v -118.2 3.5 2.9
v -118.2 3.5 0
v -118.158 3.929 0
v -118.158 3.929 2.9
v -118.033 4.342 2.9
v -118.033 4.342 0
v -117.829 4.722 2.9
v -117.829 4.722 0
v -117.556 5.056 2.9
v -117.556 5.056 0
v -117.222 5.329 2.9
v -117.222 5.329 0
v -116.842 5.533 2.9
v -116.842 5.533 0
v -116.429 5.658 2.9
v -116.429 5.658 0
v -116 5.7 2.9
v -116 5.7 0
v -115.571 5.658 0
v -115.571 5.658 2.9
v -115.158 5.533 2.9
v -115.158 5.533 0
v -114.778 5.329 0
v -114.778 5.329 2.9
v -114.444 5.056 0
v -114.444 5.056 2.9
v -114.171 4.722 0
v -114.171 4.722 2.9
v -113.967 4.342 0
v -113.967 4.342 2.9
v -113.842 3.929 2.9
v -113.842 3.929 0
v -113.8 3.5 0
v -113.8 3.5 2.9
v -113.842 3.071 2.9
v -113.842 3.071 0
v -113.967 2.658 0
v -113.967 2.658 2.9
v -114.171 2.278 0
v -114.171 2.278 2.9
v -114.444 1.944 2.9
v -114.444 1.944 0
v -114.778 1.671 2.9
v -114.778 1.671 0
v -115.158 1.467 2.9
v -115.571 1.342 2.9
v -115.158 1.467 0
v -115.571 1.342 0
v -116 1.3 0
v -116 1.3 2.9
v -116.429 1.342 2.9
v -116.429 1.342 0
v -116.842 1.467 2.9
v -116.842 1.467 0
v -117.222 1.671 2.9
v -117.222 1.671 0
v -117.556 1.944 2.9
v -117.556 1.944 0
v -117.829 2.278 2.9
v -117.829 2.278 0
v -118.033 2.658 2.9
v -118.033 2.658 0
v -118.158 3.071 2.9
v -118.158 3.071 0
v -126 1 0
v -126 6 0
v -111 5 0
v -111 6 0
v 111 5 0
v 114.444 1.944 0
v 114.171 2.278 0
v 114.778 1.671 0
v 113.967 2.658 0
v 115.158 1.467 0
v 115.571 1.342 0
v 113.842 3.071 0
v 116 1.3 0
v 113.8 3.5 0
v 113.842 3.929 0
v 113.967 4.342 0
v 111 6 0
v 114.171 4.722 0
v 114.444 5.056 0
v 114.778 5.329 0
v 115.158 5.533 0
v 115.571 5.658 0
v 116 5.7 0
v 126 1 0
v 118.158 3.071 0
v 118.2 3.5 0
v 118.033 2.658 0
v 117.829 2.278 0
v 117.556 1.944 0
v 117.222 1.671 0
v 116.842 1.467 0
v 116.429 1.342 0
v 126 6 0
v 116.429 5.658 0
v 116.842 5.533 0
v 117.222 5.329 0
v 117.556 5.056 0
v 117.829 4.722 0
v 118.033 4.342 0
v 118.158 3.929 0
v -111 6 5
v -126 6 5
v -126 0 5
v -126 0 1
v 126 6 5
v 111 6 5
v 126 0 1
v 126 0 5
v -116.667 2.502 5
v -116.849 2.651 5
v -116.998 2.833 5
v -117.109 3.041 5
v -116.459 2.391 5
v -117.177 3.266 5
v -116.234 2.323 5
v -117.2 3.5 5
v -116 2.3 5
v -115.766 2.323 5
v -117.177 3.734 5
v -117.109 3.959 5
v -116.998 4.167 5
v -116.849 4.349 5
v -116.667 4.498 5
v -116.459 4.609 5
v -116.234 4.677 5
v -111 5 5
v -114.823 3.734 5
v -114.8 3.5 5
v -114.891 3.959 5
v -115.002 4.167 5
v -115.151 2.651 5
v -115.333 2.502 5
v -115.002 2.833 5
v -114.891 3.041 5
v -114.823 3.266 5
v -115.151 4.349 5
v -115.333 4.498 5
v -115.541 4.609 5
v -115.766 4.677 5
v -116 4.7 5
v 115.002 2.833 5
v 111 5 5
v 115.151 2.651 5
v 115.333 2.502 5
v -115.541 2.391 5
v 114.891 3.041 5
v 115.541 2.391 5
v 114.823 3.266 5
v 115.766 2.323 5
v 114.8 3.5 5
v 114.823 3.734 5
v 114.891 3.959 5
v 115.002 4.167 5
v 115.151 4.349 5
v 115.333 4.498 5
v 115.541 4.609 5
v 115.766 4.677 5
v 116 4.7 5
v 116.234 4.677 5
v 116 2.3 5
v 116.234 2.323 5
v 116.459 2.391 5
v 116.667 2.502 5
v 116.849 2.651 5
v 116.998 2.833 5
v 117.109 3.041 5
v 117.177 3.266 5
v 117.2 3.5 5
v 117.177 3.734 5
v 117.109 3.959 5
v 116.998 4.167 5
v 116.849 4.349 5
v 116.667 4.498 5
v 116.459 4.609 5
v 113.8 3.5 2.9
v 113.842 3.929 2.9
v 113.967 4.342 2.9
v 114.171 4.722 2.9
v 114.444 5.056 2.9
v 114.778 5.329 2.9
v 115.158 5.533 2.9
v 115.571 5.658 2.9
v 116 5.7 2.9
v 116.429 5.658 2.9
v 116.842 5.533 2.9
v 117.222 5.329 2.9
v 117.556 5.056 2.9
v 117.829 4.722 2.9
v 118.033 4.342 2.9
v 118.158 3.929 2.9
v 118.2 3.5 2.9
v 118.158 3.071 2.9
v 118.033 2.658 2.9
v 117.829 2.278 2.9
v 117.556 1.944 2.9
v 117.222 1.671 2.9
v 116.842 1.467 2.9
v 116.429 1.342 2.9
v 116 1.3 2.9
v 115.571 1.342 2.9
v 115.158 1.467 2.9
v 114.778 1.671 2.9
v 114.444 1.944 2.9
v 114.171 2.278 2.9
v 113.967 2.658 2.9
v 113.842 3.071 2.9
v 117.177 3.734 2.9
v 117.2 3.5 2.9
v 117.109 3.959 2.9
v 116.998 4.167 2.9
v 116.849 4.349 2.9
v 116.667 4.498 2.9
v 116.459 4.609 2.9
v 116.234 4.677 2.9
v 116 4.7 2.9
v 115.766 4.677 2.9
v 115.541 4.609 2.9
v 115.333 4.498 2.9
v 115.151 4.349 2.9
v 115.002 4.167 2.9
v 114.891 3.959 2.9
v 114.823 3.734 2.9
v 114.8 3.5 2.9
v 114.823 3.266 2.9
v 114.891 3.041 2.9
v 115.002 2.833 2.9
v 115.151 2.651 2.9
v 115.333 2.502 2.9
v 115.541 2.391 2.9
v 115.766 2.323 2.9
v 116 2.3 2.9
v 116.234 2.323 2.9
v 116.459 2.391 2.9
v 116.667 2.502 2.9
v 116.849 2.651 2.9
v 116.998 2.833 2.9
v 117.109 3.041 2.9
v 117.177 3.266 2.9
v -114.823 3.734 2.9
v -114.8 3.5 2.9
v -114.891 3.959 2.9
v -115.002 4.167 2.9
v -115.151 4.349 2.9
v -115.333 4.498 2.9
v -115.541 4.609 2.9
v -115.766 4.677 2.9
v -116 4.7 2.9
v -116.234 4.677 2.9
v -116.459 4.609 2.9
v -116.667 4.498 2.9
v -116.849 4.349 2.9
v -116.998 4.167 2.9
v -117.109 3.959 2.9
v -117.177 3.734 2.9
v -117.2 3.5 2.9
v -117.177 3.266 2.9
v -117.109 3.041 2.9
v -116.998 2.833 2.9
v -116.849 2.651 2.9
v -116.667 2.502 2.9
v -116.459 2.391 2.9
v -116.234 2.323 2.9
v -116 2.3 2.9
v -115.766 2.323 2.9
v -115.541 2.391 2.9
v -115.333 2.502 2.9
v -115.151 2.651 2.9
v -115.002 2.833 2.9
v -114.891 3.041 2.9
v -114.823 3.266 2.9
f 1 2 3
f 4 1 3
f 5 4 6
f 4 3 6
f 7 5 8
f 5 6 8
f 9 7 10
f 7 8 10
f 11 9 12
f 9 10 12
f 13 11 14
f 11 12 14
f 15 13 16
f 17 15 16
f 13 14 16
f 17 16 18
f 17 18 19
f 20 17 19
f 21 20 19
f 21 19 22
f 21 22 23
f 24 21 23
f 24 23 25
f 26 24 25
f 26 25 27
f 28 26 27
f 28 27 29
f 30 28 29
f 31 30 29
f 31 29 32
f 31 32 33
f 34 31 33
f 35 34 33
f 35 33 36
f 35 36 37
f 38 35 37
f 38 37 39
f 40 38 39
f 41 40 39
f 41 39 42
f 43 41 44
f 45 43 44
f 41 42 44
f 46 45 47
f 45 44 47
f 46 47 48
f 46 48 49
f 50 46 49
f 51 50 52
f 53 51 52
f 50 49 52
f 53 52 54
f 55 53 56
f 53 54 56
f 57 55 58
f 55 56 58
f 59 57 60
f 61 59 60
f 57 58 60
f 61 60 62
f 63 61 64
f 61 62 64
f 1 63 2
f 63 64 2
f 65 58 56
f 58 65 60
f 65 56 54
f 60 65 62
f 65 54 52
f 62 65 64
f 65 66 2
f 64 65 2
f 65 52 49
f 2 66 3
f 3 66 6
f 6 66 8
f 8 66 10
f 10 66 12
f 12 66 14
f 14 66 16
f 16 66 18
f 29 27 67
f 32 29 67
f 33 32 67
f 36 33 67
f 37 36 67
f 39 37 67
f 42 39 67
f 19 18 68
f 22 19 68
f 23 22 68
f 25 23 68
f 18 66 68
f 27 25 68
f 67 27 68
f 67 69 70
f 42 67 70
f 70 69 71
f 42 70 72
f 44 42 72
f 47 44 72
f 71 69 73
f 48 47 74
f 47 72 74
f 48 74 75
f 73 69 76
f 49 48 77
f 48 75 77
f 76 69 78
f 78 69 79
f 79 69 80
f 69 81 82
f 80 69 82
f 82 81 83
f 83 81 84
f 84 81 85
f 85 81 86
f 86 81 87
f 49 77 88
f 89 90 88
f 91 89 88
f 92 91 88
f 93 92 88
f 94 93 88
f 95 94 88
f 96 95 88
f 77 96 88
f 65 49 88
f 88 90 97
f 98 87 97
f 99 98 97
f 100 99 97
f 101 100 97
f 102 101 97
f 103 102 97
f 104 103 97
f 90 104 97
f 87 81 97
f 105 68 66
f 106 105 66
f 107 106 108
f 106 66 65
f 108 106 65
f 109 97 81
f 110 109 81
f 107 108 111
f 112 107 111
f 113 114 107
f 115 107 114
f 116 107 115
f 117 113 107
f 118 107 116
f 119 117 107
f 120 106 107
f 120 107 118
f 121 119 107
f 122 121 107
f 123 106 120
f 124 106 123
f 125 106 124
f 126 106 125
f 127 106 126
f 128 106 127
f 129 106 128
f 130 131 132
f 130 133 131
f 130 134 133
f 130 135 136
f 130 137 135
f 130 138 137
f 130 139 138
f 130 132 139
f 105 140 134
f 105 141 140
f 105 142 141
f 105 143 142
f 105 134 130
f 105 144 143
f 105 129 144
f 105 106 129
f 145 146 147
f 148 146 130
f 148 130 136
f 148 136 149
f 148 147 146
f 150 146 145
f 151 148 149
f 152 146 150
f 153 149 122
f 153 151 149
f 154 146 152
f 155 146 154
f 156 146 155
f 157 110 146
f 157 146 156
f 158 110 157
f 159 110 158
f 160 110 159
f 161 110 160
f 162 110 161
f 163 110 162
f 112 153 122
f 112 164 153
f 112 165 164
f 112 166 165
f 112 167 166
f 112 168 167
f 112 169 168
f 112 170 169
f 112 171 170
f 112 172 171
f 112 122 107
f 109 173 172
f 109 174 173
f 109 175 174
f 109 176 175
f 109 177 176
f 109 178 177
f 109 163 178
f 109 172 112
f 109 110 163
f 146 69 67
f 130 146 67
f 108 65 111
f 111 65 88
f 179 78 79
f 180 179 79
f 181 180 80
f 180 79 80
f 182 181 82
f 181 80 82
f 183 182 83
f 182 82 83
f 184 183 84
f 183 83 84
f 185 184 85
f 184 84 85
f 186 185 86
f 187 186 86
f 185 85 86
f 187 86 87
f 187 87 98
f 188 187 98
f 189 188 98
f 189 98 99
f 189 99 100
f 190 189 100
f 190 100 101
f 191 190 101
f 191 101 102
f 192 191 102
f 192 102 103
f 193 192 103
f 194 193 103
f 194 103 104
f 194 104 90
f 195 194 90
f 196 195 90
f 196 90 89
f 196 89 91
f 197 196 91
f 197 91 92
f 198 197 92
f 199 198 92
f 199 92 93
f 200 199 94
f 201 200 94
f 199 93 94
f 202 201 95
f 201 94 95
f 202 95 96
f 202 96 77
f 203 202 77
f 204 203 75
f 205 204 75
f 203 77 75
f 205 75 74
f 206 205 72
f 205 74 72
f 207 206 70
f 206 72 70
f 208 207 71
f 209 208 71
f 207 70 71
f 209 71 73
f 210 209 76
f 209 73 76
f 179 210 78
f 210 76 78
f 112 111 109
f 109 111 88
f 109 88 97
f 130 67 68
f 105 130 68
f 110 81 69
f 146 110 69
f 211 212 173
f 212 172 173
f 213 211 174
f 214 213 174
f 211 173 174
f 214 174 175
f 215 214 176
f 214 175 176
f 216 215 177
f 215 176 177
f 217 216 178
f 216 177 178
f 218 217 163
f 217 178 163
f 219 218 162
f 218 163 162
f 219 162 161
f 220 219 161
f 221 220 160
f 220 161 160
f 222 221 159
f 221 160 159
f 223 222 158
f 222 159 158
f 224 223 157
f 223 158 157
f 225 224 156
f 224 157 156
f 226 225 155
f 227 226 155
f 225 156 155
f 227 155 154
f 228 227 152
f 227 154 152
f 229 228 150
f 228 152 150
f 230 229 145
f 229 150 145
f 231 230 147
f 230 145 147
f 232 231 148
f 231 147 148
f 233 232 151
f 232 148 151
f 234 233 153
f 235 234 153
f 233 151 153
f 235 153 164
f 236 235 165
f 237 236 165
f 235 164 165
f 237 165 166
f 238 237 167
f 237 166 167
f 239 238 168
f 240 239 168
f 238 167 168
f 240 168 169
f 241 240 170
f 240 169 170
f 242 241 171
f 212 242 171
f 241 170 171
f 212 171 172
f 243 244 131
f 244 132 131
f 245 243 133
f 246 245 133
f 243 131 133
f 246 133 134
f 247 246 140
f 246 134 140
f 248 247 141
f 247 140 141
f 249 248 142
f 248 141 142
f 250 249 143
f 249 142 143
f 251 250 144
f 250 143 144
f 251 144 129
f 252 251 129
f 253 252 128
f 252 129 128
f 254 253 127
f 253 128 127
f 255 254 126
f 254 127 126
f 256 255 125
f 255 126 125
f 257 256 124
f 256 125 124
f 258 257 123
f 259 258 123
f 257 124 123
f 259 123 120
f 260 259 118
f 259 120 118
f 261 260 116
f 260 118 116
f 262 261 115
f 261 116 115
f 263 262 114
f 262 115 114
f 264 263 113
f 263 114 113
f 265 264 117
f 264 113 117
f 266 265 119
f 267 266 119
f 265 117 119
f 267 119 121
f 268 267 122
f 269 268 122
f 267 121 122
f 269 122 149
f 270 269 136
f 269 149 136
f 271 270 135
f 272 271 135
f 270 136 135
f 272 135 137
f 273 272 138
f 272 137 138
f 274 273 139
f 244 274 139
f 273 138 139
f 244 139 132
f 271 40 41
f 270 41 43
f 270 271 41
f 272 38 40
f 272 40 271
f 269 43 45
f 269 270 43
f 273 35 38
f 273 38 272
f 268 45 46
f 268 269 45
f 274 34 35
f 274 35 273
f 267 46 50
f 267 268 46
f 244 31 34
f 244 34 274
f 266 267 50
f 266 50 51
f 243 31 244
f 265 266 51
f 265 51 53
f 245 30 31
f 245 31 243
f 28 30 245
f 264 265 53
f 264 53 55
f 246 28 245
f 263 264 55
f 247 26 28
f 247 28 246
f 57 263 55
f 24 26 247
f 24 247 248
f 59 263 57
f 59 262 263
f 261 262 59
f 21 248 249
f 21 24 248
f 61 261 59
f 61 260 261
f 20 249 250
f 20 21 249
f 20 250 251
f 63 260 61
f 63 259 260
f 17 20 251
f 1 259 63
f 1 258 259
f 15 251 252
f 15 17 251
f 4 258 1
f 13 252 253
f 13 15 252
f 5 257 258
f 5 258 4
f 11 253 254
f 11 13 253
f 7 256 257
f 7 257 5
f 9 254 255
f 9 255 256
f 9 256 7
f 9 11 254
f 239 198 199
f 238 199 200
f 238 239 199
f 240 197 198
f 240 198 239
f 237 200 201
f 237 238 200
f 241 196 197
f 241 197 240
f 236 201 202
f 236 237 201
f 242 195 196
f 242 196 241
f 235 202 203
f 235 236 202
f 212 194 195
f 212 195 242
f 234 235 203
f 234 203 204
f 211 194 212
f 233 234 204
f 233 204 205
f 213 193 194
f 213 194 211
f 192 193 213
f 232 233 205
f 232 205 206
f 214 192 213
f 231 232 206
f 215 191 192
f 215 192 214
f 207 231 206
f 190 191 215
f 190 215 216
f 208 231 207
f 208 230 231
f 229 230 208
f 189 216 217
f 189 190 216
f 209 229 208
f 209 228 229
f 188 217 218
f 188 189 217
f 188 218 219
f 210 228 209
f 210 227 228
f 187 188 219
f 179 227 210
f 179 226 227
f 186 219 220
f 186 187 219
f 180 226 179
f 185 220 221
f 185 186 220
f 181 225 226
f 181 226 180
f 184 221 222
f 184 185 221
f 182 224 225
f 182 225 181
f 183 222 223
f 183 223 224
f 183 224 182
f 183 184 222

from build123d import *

# Parameters (mm, degrees)
EXTRUDE_1_DEPTH             = 5
CHAMFER_1_SIZE              = 1
HOLE_WIZARD_M21_D           = 2.4
HOLE_WIZARD_M21_CBORE_D     = 4.4
HOLE_WIZARD_M21_CBORE_DEPTH = 2.9


with BuildPart() as part:
    # Эскиз1 → Бобышка-Вытянуть1 (new body)
    with BuildSketch(Plane.XY):
        Polygon((-126, 0), (126, 0), (126, 6), (111, 6), (111, 5), (-111, 5), (-111, 6), (-126, 6), align=None)
    extrude(amount=EXTRUDE_1_DEPTH)

    # Фаска1
    chamfer_1_edges = [part.edges().sort_by_distance(p)[0] for p in [
        (0, 0, 0),
    ]]
    chamfer(chamfer_1_edges, length=CHAMFER_1_SIZE)

    # Цековка для  винта с внутренним шестигранником M21 (through all)
    with Locations(Plane(origin=(0, 0, 0), x_dir=(-1, 0, 0), z_dir=(0, 0, -1))):
        with Locations((-116, 3.5), (116, 3.5)):
            CounterBoreHole(HOLE_WIZARD_M21_D / 2, HOLE_WIZARD_M21_CBORE_D / 2, HOLE_WIZARD_M21_CBORE_DEPTH)


solid = part.part
